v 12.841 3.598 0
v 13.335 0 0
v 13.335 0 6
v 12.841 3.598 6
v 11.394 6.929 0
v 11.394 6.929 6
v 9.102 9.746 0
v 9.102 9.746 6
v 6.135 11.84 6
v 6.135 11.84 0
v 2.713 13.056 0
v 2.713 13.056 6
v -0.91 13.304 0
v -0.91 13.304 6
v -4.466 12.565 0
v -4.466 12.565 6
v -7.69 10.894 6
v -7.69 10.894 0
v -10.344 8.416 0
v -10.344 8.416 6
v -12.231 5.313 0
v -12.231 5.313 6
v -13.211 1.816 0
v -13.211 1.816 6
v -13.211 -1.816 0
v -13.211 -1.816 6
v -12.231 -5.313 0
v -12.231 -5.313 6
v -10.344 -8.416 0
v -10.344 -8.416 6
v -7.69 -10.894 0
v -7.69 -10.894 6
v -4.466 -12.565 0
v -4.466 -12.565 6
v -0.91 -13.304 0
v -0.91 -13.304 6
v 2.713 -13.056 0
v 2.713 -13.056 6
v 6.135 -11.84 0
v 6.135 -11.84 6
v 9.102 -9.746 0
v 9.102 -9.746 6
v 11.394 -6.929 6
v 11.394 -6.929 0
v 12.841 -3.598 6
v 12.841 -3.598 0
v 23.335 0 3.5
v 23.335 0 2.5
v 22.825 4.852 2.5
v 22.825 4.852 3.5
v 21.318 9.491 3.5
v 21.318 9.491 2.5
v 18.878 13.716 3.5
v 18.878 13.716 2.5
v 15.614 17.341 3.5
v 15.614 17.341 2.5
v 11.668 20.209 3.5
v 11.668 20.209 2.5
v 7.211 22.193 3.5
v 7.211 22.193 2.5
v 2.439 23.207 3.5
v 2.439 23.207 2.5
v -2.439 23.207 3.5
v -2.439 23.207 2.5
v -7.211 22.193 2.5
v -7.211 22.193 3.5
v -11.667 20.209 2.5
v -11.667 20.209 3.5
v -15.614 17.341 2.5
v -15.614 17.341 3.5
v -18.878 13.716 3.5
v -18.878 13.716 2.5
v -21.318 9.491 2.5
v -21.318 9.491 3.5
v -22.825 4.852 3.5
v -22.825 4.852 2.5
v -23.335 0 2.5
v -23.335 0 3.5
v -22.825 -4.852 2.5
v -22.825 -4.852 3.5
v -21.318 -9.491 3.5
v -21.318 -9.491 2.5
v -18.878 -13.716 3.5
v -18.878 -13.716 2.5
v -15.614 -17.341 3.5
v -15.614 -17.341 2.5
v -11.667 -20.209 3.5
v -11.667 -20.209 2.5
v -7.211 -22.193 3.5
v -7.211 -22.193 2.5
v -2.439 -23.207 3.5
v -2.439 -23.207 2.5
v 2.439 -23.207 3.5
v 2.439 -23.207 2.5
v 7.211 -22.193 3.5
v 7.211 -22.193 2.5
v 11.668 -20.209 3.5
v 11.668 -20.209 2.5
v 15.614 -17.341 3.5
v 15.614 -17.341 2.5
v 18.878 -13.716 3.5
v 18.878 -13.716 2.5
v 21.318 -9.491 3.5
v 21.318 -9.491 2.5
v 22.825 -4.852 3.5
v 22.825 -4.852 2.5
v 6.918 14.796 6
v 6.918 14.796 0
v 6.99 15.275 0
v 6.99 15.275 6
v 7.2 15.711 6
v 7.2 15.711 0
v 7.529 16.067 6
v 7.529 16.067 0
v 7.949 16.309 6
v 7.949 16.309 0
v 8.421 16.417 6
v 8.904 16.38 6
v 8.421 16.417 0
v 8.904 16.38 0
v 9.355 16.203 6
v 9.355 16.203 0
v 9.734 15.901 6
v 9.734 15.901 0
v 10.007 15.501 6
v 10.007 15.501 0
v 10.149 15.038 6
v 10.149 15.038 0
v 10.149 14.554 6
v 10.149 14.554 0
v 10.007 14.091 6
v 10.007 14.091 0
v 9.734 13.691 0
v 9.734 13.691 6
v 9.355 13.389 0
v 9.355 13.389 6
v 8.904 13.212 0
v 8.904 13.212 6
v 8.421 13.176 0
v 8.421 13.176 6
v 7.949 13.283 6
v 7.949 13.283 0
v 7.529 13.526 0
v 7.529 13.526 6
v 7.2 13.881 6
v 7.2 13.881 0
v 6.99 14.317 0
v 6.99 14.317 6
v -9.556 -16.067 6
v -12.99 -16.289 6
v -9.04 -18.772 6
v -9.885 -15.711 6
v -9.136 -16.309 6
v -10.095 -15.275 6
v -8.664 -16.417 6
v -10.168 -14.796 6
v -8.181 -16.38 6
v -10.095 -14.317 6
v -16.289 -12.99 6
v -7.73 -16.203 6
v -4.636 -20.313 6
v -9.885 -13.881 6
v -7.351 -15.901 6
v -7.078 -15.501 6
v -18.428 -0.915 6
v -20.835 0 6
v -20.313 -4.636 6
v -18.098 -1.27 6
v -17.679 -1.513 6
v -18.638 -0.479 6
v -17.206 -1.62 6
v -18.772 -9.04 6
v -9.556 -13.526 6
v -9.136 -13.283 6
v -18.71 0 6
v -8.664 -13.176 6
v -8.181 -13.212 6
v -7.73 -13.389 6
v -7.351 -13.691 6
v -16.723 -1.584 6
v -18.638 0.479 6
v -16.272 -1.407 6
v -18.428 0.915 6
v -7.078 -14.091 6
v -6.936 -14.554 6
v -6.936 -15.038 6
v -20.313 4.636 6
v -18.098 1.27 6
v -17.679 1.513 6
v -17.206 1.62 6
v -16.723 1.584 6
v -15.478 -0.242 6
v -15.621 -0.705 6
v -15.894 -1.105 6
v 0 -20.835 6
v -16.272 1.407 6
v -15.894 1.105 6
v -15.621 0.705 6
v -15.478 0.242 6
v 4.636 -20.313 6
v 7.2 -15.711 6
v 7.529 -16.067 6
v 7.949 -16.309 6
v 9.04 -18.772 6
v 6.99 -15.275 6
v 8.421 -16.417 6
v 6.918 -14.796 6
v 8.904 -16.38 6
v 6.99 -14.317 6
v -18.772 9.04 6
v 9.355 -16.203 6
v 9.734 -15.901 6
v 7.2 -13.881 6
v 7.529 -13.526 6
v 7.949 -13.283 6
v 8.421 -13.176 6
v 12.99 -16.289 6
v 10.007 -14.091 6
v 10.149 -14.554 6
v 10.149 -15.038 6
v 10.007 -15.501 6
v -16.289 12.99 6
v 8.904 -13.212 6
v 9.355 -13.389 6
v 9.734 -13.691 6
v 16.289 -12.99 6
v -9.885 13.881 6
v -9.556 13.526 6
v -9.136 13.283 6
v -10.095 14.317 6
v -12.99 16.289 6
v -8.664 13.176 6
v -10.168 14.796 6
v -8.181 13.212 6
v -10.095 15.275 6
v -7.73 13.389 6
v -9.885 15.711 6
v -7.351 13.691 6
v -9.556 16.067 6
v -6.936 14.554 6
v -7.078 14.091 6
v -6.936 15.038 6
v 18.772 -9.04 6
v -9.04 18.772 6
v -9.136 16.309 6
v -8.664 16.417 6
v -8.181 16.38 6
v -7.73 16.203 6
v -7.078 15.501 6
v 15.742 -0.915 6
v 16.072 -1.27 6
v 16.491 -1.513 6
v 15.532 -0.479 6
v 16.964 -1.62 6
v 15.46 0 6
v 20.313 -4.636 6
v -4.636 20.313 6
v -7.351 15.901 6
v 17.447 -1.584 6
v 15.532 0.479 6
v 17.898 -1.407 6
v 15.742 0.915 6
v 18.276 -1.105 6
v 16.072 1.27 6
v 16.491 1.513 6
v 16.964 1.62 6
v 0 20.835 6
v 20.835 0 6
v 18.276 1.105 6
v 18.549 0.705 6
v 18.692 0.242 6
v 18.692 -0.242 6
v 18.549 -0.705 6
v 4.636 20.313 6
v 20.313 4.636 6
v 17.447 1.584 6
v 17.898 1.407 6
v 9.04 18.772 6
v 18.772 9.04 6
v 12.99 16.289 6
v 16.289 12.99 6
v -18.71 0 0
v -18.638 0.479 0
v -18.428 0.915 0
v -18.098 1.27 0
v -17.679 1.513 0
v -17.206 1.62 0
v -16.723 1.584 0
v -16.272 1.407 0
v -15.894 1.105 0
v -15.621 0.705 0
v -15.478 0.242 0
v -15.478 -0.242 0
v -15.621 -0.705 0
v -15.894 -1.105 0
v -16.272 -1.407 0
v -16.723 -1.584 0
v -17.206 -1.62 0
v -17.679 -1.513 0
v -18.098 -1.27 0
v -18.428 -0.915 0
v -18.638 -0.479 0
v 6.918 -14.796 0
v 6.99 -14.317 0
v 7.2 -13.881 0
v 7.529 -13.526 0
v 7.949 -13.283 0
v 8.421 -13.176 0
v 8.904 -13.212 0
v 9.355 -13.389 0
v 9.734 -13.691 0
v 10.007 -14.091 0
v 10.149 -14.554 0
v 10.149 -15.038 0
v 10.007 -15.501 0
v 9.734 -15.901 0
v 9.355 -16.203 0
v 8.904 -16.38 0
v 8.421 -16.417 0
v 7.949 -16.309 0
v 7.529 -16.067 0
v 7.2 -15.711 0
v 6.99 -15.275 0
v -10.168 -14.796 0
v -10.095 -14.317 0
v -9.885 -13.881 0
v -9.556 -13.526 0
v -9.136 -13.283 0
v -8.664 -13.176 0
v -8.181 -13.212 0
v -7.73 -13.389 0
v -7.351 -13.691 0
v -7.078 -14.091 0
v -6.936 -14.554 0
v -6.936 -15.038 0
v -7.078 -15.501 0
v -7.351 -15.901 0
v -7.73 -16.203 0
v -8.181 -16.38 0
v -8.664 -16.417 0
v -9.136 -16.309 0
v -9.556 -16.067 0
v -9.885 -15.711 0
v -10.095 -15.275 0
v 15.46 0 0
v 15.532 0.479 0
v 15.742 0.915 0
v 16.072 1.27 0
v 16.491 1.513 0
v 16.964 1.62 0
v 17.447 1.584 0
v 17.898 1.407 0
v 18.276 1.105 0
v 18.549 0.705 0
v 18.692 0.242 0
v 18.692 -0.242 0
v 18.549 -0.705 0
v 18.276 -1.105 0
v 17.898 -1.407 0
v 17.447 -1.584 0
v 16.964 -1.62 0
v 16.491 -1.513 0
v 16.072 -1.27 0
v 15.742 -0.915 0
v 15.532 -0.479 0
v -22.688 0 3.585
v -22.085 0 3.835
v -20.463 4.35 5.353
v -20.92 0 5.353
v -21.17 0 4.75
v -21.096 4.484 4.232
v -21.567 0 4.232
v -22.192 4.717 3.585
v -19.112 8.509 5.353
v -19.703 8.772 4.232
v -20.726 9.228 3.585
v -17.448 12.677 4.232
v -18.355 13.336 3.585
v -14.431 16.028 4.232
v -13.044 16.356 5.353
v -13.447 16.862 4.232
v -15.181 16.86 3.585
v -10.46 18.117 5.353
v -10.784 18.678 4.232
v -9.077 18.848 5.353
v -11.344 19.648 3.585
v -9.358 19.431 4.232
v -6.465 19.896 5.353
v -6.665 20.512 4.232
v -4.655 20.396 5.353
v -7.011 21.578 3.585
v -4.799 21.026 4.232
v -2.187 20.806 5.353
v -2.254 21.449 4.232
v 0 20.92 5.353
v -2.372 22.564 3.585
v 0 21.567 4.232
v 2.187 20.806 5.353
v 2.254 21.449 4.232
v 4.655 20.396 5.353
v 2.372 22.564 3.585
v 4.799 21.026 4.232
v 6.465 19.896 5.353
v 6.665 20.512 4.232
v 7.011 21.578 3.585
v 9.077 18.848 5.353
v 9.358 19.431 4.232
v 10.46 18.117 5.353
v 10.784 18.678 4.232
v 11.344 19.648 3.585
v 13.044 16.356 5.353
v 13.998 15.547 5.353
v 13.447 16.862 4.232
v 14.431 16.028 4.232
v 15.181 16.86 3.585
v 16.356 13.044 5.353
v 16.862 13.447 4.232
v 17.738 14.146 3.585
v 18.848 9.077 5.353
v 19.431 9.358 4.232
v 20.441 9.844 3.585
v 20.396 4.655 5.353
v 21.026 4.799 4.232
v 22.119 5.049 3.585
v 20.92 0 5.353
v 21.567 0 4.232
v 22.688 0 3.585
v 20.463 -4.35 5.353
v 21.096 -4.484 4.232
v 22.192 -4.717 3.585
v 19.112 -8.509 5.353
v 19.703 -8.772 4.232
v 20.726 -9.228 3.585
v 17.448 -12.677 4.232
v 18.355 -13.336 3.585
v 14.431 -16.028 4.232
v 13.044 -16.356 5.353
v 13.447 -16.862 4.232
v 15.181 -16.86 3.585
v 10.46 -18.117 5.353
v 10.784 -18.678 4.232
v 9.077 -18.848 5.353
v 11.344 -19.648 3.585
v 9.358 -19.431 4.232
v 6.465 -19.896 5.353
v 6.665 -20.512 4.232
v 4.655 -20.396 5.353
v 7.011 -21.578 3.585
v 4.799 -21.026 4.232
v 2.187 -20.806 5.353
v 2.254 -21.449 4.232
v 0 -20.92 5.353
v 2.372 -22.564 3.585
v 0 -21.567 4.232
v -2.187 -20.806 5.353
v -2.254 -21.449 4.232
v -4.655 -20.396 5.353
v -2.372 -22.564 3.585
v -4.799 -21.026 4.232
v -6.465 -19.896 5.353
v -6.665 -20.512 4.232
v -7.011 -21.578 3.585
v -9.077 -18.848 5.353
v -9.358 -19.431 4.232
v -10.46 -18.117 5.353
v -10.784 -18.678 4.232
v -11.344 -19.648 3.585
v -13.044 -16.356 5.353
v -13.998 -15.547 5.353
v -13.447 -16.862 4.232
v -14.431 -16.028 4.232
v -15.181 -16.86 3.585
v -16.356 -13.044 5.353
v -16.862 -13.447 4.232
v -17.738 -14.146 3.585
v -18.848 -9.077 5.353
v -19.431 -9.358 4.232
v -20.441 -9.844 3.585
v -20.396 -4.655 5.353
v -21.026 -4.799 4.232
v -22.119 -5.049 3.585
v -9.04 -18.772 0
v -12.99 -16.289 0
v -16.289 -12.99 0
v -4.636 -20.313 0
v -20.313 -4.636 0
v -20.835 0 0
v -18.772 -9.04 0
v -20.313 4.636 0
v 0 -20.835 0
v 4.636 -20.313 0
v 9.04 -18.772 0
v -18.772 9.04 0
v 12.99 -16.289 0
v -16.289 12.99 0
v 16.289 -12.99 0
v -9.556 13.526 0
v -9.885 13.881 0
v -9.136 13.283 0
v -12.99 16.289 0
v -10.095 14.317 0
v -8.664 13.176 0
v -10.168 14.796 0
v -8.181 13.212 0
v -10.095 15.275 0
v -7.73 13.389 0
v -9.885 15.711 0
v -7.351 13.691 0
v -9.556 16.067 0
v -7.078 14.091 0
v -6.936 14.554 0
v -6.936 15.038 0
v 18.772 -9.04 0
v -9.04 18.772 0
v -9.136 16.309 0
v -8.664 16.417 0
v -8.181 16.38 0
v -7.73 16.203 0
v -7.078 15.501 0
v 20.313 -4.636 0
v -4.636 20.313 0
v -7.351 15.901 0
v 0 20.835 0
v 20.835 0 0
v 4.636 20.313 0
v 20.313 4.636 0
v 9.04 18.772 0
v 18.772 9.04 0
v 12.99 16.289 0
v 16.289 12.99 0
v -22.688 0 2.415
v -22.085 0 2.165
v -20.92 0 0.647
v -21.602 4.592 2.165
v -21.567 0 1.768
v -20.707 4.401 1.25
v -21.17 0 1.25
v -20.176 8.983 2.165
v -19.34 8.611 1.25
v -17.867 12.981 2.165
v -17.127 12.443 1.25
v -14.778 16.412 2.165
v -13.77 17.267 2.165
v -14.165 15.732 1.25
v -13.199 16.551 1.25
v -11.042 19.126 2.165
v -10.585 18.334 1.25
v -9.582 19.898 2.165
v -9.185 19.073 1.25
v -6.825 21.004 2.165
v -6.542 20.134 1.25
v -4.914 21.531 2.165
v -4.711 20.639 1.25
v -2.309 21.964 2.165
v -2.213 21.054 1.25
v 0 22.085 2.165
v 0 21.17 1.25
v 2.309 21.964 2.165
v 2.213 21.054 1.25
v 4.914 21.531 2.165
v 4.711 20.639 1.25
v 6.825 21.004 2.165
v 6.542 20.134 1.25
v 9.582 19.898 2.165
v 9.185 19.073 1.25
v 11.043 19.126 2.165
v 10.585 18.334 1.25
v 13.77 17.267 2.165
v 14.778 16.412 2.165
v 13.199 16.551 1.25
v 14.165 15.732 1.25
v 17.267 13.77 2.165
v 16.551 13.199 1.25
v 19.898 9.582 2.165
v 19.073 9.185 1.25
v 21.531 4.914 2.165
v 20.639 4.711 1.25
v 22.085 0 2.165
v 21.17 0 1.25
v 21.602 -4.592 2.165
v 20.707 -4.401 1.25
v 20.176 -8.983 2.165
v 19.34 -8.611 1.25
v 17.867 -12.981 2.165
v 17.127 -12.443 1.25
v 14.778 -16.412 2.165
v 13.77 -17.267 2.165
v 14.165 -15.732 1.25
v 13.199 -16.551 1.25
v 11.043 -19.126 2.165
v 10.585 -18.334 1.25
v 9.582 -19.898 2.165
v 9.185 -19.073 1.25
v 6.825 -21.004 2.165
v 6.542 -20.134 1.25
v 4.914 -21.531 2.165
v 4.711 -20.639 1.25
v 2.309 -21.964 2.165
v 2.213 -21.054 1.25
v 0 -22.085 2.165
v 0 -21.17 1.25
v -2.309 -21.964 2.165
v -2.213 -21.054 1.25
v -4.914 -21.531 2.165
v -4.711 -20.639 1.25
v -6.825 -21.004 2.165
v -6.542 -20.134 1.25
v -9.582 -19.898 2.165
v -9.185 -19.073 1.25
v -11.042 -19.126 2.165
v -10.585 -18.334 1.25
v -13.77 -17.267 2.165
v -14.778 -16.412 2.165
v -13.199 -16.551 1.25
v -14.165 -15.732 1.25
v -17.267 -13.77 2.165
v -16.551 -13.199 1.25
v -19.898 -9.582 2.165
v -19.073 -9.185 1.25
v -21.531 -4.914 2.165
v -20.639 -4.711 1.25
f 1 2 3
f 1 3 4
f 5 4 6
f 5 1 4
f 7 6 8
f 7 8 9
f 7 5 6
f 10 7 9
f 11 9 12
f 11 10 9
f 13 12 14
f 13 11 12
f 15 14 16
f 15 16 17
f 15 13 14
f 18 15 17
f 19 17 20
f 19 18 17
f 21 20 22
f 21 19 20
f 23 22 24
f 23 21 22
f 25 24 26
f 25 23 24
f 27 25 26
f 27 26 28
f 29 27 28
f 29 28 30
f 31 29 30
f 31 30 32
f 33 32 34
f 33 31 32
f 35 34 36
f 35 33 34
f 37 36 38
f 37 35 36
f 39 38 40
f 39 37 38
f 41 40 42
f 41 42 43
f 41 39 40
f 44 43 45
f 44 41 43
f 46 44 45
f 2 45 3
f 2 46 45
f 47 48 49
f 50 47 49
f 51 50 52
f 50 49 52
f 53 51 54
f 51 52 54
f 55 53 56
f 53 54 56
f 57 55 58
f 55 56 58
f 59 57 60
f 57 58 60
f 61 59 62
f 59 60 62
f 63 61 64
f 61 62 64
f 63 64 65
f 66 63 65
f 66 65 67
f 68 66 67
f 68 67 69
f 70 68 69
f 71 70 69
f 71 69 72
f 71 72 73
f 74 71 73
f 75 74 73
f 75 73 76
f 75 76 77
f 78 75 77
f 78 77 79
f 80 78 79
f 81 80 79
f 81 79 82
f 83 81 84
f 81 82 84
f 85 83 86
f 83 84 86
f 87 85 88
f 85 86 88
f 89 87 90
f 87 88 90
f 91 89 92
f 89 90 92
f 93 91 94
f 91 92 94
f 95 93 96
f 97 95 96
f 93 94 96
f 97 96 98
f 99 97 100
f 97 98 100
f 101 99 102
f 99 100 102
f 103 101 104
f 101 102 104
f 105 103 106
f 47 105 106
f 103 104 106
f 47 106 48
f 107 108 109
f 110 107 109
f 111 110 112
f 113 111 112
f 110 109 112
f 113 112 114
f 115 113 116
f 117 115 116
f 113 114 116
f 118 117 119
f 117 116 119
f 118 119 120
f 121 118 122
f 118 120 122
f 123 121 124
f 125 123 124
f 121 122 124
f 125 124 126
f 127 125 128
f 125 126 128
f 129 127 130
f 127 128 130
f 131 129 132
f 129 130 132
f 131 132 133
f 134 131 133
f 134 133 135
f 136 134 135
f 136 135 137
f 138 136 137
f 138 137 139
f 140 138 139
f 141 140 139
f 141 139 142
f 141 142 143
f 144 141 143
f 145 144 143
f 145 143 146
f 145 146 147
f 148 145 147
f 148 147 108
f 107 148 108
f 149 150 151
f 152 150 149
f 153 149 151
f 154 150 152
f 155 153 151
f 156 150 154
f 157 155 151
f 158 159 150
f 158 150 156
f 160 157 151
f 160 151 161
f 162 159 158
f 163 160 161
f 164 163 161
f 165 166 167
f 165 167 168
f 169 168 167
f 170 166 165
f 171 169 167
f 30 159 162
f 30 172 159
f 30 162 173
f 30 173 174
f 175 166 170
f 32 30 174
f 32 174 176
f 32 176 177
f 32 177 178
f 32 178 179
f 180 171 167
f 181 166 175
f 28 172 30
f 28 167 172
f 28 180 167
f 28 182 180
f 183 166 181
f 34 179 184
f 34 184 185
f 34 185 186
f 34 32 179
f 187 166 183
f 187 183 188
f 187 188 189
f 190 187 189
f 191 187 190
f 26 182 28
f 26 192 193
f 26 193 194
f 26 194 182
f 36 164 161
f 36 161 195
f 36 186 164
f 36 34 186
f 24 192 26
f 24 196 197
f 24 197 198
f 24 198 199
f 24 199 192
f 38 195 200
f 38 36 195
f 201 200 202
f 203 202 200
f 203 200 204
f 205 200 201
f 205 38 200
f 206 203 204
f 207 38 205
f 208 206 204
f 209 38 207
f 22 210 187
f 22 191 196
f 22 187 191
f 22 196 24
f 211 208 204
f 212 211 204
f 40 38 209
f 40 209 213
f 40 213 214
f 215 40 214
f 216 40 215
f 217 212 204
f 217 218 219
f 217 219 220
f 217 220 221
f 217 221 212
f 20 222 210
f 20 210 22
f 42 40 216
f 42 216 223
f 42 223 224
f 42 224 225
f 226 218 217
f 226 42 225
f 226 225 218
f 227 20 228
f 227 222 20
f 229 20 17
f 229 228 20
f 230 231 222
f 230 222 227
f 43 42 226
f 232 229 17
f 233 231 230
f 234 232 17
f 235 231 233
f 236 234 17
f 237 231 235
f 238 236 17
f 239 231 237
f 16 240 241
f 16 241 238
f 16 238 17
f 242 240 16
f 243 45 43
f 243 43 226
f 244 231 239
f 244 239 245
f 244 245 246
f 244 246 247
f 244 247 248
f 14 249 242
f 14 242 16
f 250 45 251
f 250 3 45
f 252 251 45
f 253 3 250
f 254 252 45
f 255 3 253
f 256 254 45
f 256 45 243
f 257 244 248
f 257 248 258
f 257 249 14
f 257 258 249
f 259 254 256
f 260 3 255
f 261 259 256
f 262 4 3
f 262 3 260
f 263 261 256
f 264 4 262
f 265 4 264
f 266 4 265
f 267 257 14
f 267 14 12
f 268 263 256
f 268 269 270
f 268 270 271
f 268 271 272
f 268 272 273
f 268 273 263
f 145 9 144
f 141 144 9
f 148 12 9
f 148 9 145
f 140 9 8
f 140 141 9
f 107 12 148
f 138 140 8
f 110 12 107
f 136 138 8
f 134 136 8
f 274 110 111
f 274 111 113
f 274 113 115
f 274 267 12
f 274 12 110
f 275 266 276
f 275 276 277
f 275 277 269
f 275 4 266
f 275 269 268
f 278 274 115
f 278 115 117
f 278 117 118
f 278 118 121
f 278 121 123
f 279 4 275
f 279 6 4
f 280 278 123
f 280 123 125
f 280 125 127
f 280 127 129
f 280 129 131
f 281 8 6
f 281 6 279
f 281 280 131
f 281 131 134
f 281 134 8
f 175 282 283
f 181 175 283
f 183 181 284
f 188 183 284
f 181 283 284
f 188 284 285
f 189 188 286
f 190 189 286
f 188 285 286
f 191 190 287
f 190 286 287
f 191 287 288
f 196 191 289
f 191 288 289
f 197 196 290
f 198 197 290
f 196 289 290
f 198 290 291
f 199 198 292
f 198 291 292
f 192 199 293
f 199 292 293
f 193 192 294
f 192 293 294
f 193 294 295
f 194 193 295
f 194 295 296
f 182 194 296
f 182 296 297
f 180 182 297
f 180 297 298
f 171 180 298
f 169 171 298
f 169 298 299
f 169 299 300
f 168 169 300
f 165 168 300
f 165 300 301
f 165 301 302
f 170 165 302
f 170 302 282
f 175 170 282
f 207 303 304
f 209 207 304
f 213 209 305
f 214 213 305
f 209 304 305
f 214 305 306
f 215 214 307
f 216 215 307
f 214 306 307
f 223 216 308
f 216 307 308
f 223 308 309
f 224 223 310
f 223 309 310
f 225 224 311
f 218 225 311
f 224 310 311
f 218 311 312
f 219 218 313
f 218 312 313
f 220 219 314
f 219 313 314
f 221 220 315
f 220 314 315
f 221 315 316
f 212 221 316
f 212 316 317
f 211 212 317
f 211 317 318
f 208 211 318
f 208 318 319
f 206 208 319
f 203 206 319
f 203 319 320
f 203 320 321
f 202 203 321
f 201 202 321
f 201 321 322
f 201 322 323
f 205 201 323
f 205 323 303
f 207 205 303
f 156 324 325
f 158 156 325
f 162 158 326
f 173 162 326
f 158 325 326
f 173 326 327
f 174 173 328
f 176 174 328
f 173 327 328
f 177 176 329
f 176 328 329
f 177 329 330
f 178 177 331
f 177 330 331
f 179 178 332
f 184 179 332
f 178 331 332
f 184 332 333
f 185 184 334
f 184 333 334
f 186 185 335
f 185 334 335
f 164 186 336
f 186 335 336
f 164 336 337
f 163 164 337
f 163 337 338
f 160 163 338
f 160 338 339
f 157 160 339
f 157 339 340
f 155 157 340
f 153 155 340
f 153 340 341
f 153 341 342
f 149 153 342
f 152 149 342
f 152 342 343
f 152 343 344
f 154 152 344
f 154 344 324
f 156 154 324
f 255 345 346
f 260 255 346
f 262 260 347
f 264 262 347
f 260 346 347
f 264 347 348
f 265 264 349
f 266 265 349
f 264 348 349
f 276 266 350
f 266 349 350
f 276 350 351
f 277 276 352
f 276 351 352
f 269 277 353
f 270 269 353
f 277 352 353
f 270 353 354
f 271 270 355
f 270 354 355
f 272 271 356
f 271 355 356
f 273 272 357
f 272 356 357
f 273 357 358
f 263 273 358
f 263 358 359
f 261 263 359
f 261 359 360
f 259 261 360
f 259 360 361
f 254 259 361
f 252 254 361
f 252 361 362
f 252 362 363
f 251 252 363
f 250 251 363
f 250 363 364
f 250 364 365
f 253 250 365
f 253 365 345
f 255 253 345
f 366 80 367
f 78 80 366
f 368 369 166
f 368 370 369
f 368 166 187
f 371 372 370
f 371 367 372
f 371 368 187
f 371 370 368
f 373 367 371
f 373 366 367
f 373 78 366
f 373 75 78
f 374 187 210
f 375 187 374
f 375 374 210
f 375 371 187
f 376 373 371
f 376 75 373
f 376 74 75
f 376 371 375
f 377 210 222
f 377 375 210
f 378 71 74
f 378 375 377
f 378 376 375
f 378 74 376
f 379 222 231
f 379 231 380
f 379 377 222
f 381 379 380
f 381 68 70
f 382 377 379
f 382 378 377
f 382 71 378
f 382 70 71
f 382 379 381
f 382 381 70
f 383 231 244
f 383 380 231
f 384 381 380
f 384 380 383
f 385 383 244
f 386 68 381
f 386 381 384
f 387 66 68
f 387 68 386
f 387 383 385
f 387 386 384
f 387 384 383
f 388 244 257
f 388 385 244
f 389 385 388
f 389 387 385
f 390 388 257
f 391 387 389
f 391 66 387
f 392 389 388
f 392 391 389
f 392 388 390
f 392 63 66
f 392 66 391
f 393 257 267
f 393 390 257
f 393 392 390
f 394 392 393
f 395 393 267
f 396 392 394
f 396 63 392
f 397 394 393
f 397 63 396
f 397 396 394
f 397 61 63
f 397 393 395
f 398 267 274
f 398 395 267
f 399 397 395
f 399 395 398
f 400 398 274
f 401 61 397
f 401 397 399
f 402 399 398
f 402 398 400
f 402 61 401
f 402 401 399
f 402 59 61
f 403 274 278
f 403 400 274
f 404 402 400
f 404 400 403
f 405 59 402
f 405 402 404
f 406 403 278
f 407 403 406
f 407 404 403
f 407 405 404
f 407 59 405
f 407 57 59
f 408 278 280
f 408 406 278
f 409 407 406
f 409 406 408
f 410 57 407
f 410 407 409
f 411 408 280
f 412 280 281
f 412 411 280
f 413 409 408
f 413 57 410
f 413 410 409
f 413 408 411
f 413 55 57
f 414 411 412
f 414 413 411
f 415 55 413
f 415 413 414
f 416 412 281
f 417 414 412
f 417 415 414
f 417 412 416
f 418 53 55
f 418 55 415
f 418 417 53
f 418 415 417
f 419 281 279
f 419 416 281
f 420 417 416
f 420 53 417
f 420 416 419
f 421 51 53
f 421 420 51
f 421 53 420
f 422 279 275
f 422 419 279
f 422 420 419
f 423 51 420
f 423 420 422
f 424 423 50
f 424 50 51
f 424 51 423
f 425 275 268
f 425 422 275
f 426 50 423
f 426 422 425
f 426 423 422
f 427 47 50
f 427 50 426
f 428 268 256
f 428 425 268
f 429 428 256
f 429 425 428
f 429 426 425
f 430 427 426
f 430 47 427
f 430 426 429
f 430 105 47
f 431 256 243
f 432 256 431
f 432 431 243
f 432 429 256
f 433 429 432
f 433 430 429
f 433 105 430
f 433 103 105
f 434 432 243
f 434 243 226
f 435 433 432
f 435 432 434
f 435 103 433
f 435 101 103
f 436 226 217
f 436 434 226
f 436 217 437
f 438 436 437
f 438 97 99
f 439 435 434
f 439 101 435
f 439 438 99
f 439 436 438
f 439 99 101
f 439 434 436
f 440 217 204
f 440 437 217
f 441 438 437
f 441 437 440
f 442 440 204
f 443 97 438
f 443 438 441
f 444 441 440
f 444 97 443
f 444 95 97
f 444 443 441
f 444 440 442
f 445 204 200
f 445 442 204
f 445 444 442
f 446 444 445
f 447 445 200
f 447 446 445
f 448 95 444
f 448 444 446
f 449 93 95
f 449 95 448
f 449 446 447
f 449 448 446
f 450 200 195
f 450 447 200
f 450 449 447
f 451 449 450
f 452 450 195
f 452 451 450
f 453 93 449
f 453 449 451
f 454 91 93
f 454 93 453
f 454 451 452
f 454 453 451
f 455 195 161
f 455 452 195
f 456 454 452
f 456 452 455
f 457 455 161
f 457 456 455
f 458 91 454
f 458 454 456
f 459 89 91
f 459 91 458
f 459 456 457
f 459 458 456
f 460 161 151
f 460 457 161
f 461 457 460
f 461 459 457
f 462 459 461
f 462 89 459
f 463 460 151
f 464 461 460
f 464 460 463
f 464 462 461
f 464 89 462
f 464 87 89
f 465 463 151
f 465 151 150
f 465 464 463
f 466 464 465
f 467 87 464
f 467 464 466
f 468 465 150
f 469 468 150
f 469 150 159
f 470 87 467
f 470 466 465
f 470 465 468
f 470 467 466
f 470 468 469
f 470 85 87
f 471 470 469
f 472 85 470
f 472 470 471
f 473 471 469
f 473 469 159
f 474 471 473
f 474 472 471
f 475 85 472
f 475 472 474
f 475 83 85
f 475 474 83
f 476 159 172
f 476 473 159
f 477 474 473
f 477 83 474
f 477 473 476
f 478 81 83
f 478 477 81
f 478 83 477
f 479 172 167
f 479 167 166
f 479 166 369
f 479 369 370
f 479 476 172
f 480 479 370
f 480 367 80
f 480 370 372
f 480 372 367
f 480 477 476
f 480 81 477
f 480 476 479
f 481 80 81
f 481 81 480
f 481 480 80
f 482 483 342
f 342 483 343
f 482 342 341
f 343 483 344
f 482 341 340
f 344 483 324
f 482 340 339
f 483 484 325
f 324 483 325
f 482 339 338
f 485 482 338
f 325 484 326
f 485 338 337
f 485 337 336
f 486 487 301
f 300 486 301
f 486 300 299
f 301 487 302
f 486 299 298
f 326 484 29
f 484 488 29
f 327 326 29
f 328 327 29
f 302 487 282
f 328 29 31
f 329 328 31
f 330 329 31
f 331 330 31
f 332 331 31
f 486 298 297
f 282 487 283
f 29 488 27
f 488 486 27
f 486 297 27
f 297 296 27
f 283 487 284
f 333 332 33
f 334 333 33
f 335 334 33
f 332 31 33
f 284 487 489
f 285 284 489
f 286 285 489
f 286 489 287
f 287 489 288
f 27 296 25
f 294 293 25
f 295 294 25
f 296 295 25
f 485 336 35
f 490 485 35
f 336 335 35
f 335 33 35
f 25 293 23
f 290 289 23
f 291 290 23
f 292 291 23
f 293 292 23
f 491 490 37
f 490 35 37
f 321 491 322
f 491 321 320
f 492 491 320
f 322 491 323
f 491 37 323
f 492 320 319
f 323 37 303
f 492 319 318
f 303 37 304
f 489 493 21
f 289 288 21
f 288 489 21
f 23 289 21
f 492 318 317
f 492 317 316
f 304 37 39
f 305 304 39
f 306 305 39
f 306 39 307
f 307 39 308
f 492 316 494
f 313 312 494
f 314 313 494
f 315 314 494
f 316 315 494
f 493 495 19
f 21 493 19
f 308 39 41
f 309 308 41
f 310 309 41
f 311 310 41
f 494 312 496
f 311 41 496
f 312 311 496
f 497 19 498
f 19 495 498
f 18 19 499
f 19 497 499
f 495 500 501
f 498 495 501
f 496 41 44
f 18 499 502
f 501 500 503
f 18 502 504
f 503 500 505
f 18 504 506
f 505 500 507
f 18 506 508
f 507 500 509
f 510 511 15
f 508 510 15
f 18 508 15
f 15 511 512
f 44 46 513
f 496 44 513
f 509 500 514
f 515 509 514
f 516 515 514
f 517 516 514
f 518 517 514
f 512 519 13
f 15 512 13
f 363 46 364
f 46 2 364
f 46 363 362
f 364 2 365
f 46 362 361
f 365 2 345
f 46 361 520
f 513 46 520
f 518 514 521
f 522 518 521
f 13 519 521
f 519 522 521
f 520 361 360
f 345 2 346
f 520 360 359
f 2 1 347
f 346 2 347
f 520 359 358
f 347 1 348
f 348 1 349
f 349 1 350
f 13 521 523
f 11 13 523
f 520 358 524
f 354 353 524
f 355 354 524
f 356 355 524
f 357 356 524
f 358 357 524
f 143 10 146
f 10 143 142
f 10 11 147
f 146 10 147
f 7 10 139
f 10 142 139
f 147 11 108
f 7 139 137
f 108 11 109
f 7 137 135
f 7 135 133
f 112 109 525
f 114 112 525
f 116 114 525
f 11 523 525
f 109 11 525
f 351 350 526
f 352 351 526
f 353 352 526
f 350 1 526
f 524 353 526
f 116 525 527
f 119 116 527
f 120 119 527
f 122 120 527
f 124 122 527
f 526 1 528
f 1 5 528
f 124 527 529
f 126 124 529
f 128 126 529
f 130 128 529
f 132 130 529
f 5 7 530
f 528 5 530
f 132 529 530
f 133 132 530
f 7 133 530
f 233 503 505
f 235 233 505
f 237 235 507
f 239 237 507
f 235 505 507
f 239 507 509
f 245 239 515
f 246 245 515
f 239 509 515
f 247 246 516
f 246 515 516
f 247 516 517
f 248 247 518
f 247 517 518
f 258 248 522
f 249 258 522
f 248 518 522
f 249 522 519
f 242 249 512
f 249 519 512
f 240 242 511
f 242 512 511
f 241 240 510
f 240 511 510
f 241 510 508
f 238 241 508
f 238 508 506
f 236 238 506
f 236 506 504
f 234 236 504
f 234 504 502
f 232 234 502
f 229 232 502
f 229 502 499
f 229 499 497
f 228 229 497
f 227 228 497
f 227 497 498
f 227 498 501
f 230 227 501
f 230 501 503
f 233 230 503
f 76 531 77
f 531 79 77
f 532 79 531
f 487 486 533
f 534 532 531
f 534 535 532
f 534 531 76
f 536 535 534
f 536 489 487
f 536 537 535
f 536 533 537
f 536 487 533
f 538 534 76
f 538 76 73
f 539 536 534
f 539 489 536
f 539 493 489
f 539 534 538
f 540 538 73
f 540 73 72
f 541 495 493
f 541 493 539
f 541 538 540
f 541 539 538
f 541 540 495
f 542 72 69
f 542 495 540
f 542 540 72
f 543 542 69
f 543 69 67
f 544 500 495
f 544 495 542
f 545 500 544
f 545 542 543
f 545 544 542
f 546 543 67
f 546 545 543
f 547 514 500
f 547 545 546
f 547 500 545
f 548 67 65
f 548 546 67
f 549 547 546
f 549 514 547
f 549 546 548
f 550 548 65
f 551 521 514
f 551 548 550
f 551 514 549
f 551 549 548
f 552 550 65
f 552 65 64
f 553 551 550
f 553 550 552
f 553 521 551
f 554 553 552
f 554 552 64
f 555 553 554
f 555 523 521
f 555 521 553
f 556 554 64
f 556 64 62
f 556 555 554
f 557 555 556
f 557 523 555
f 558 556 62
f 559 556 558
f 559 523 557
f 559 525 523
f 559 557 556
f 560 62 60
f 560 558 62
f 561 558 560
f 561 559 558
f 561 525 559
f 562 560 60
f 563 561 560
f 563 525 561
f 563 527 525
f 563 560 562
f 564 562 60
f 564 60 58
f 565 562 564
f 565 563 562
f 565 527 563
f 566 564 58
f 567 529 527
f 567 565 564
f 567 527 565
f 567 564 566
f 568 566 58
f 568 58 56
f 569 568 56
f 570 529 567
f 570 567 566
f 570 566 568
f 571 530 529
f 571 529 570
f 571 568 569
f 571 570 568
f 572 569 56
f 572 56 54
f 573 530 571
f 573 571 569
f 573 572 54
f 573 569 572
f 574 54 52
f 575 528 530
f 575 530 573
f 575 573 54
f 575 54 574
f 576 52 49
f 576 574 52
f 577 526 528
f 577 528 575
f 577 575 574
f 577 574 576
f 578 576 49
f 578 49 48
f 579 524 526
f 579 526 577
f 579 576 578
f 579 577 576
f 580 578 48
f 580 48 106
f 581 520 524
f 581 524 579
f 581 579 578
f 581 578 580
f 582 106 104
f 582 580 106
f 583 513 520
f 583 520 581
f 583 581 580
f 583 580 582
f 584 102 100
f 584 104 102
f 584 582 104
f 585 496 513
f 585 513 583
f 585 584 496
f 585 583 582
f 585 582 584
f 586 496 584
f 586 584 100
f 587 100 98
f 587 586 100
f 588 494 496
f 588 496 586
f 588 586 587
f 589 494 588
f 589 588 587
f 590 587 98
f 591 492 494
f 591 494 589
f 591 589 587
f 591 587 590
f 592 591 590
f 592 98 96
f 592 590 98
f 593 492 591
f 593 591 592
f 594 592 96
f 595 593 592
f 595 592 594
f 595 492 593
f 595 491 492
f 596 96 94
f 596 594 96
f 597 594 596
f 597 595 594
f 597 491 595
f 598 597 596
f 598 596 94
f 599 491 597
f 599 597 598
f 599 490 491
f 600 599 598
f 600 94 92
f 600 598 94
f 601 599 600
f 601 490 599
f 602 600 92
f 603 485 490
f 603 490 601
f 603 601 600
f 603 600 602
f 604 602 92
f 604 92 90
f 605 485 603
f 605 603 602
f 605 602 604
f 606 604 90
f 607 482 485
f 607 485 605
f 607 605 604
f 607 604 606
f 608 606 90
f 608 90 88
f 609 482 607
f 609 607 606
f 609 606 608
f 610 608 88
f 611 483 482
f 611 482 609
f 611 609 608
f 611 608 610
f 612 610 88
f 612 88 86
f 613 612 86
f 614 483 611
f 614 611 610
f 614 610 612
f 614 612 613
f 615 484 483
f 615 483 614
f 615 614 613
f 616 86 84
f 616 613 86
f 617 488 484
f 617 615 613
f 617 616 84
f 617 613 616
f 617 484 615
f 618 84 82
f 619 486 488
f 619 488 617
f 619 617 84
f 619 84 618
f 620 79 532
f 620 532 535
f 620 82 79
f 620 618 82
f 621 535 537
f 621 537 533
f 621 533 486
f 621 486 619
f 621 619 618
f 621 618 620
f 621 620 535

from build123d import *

# Parameters (mm, degrees)
SKETCH2_R           = 23.335
SKETCH2_R_2         = 13.335
BOSS_EXTRUDE1_DEPTH = 6
SKETCH3_R           = 2.5
SKETCH4_R           = 1.625
CUT_EXTRUDE1_DEPTH  = 7


with BuildPart() as part:
    # Sketch2 → Boss-Extrude1 (new body)
    with BuildSketch(Plane.XY):
        Circle(SKETCH2_R)
        Circle(SKETCH2_R_2, mode=Mode.SUBTRACT)
    extrude(amount=BOSS_EXTRUDE1_DEPTH)

    # Sketch3 → Cut-Revolve1 (revolve, cut)
    with BuildSketch(Plane(origin=(0, 0, 0), x_dir=(1, 0, 0), z_dir=(0, 1, 0))):
        with Locations((-23.335, 0)):
            Circle(SKETCH3_R)
        with Locations((-23.335, -6)):
            Circle(SKETCH3_R)
    revolve(axis=Axis((0, 0, 6), (0, 0, -1)), mode=Mode.SUBTRACT)

    # Sketch4 → Cut-Extrude1 (cut, through all)
    with BuildSketch(Plane(origin=(0, 0, 0), x_dir=(-1, 0, 0), z_dir=(0, 0, -1))):
        with Locations((8.5425, 14.796044024)):
            Circle(SKETCH4_R)
        with Locations((-8.5425, 14.796044024)):
            Circle(SKETCH4_R)
        with Locations((-17.085, 0)):
            Circle(SKETCH4_R)
        with Locations((-8.5425, -14.796044024)):
            Circle(SKETCH4_R)
        with Locations((8.5425, -14.796044024)):
            Circle(SKETCH4_R)
        with Locations((17.085, 0)):
            Circle(SKETCH4_R)
    extrude(amount=-CUT_EXTRUDE1_DEPTH, mode=Mode.SUBTRACT)


solid = part.part
